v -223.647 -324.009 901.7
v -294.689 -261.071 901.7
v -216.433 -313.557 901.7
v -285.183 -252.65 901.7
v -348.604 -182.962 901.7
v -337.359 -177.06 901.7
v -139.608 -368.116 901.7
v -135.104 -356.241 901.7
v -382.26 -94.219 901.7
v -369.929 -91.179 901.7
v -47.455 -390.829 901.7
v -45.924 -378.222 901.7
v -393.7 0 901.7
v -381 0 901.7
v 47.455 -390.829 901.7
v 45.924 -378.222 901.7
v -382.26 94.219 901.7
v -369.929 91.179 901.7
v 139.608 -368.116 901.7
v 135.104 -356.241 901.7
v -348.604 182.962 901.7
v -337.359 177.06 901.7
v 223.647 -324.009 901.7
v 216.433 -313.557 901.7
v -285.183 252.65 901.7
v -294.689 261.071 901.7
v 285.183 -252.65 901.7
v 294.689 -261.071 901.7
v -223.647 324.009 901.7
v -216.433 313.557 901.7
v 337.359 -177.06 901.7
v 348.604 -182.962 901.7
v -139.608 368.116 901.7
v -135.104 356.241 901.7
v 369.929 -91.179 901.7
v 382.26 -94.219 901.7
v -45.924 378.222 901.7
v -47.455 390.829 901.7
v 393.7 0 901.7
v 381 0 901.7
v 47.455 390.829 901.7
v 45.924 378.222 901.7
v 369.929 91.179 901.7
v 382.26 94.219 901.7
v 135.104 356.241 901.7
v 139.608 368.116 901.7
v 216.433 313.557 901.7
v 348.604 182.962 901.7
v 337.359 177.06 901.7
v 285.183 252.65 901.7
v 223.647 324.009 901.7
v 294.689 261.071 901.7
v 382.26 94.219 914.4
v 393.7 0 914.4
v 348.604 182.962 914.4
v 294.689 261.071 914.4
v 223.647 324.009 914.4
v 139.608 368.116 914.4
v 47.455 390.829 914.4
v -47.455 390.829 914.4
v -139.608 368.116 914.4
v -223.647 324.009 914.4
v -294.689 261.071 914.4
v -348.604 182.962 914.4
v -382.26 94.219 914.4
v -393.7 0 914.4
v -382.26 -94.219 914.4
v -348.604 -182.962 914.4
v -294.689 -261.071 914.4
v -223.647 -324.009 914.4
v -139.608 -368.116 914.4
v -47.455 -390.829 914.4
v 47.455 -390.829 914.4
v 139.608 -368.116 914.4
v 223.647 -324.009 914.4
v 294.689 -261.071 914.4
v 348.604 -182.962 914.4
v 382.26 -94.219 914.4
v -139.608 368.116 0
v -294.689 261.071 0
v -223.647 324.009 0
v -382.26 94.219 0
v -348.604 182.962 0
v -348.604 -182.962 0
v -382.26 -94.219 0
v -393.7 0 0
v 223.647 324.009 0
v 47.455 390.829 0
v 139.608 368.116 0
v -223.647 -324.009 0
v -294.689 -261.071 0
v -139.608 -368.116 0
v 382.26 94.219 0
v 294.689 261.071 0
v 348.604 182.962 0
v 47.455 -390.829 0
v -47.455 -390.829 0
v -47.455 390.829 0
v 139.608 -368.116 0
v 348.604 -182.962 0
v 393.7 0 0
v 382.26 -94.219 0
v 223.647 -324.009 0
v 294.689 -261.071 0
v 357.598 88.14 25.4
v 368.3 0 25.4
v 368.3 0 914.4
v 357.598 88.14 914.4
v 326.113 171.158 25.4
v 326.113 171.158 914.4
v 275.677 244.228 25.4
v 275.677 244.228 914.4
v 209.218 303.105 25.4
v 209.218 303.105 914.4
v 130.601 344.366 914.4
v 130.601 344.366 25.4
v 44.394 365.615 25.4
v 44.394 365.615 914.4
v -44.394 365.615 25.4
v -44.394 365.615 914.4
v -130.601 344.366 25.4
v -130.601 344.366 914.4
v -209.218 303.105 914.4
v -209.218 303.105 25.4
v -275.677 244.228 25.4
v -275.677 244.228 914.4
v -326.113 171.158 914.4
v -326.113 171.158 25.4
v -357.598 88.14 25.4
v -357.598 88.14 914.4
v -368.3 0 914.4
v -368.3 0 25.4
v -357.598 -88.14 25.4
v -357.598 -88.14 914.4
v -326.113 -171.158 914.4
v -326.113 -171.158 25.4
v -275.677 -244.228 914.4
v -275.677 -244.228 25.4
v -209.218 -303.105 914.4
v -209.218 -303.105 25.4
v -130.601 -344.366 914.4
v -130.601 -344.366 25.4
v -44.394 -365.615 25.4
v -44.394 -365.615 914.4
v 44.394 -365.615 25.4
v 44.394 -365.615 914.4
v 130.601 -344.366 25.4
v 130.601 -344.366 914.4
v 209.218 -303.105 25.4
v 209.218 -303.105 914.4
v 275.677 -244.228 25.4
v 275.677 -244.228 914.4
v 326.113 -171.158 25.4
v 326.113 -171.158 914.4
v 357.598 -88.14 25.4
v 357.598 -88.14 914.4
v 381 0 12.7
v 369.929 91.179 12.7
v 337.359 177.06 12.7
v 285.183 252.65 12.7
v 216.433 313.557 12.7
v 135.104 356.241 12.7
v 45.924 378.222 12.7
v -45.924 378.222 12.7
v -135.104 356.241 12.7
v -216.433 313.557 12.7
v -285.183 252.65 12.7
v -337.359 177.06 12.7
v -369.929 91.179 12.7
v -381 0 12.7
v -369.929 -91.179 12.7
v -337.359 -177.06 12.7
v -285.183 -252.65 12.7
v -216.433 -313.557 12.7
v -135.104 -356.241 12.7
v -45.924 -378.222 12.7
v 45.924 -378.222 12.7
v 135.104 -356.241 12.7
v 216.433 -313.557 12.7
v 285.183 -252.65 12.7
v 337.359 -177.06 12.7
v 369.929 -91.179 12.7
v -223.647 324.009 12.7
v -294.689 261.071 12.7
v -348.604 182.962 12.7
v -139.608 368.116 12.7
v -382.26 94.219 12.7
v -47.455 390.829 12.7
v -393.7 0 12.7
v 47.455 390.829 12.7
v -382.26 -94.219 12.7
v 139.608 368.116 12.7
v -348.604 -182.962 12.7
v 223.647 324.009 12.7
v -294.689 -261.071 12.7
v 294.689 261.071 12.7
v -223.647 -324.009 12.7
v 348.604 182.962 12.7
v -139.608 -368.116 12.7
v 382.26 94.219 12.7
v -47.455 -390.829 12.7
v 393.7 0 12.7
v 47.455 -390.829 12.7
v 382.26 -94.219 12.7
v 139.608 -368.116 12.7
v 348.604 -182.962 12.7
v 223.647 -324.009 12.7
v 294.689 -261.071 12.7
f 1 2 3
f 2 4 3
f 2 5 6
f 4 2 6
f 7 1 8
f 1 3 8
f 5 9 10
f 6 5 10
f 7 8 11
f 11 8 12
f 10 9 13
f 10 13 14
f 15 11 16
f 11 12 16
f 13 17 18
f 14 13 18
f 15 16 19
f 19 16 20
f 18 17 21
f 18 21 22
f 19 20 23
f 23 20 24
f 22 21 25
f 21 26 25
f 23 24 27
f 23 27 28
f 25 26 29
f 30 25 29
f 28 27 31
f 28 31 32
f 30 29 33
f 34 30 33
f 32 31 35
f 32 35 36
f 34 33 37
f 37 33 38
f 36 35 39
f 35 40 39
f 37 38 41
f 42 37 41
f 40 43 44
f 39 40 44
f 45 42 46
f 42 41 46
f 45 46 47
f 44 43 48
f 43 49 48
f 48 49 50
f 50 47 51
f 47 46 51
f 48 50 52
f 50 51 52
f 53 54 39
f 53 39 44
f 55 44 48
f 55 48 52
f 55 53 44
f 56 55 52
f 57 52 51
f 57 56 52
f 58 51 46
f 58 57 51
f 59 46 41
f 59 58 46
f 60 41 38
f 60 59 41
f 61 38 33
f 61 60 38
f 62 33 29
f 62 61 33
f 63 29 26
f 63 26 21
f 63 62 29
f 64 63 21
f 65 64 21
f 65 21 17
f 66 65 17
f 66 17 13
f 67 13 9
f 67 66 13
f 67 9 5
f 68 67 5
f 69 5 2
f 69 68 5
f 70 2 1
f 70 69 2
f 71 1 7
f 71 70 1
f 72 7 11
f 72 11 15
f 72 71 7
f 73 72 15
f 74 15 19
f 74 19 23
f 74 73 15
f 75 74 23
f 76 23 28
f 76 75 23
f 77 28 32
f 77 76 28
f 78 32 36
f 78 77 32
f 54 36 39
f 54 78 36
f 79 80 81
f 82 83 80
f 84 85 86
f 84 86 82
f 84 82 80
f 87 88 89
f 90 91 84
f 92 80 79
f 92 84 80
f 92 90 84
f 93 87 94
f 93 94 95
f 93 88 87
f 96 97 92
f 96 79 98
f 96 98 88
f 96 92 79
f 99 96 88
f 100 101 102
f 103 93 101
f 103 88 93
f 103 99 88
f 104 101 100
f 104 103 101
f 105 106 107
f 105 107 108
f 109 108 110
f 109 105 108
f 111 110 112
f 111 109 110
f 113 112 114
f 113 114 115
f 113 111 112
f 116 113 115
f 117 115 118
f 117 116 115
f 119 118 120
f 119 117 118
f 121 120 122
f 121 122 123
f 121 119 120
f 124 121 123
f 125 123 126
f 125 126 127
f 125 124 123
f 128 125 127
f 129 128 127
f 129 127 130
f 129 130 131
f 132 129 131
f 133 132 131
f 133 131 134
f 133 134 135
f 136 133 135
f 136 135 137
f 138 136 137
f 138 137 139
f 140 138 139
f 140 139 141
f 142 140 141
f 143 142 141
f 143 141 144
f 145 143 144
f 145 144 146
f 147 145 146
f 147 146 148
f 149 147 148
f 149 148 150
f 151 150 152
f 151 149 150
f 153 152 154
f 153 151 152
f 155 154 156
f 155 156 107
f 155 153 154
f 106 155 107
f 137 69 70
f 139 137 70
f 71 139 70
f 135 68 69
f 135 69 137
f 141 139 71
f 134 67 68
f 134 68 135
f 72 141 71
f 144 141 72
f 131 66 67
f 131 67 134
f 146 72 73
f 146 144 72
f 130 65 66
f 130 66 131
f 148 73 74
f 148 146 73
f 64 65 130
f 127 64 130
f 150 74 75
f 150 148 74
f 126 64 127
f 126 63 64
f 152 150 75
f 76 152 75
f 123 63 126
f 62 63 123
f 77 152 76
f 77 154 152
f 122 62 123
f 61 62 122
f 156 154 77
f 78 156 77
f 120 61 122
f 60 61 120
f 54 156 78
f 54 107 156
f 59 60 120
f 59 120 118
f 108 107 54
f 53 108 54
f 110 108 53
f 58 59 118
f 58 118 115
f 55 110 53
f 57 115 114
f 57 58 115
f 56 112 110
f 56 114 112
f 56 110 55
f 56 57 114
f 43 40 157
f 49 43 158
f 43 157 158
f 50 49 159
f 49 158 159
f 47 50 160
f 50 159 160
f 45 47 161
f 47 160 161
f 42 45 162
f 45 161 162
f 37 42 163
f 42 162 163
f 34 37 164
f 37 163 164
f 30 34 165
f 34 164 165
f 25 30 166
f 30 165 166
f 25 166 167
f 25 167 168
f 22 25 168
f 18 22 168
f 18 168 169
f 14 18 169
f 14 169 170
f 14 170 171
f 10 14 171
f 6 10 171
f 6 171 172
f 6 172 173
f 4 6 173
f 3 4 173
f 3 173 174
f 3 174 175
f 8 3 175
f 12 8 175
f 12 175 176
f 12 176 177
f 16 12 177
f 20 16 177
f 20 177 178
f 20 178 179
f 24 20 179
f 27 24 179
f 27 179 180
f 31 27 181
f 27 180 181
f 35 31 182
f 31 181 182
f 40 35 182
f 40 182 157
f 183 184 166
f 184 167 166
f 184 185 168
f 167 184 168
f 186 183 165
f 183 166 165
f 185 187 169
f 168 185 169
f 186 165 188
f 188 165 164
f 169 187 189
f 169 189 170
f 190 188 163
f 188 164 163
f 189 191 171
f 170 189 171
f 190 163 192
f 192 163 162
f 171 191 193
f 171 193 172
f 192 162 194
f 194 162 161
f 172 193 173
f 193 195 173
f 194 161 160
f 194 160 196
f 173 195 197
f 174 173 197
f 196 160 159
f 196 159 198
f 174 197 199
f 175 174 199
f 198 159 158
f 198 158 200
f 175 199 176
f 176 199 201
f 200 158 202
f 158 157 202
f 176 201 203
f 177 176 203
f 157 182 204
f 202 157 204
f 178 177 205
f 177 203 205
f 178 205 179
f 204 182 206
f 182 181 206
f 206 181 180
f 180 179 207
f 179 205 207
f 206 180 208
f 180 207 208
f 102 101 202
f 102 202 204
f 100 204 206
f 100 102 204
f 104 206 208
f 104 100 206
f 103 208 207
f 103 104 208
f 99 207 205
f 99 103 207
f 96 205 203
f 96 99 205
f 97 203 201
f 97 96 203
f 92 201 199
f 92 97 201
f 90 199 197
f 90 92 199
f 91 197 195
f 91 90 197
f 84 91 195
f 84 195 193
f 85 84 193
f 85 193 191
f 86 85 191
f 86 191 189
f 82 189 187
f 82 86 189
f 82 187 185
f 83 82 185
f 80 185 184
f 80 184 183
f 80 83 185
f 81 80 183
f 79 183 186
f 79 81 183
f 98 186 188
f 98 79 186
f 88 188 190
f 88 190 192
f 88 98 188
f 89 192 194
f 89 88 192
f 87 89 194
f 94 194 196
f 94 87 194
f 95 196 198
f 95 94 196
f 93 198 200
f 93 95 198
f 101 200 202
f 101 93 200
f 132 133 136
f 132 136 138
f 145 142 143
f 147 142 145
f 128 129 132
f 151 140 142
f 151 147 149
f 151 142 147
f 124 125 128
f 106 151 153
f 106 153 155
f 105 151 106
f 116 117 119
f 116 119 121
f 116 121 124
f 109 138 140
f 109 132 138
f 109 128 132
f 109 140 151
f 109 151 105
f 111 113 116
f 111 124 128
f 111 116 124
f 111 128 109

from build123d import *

# Parameters (mm, degrees)
F0_R     = 368.3
F1_DEPTH = 25.4
F0_R_2   = 381
F2_DEPTH = 914.4
F3_R     = 393.7
F3_R_2   = 381
F4_DEPTH = 12.7
F5_R     = 393.7
F5_R_2   = 381
F6_DEPTH = 12.7


with BuildPart() as f1:
    # F0 (on Top) → F1 (new body)
    with BuildSketch(Plane.XY):
        Circle(F0_R)
    extrude(amount=F1_DEPTH)

    # F0 (on Top) → F2 (join)
    with BuildSketch(Plane.XY):
        Circle(F0_R_2)
        Circle(F0_R, mode=Mode.SUBTRACT)
    extrude(amount=F2_DEPTH)

    # F3 (on face) → F4 (join)
    with BuildSketch(Plane(origin=(0, 0, 0), x_dir=(1, 0, 0), z_dir=(0, 0, -1))):
        Circle(F3_R)
        Circle(F3_R_2, mode=Mode.SUBTRACT)
    extrude(amount=-F4_DEPTH)

    # F5 (on face) → F6 (join)
    with BuildSketch(Plane.XY.offset(914.4)):
        Circle(F5_R)
        Circle(F5_R_2, mode=Mode.SUBTRACT)
    extrude(amount=-F6_DEPTH)


solid = f1.part
